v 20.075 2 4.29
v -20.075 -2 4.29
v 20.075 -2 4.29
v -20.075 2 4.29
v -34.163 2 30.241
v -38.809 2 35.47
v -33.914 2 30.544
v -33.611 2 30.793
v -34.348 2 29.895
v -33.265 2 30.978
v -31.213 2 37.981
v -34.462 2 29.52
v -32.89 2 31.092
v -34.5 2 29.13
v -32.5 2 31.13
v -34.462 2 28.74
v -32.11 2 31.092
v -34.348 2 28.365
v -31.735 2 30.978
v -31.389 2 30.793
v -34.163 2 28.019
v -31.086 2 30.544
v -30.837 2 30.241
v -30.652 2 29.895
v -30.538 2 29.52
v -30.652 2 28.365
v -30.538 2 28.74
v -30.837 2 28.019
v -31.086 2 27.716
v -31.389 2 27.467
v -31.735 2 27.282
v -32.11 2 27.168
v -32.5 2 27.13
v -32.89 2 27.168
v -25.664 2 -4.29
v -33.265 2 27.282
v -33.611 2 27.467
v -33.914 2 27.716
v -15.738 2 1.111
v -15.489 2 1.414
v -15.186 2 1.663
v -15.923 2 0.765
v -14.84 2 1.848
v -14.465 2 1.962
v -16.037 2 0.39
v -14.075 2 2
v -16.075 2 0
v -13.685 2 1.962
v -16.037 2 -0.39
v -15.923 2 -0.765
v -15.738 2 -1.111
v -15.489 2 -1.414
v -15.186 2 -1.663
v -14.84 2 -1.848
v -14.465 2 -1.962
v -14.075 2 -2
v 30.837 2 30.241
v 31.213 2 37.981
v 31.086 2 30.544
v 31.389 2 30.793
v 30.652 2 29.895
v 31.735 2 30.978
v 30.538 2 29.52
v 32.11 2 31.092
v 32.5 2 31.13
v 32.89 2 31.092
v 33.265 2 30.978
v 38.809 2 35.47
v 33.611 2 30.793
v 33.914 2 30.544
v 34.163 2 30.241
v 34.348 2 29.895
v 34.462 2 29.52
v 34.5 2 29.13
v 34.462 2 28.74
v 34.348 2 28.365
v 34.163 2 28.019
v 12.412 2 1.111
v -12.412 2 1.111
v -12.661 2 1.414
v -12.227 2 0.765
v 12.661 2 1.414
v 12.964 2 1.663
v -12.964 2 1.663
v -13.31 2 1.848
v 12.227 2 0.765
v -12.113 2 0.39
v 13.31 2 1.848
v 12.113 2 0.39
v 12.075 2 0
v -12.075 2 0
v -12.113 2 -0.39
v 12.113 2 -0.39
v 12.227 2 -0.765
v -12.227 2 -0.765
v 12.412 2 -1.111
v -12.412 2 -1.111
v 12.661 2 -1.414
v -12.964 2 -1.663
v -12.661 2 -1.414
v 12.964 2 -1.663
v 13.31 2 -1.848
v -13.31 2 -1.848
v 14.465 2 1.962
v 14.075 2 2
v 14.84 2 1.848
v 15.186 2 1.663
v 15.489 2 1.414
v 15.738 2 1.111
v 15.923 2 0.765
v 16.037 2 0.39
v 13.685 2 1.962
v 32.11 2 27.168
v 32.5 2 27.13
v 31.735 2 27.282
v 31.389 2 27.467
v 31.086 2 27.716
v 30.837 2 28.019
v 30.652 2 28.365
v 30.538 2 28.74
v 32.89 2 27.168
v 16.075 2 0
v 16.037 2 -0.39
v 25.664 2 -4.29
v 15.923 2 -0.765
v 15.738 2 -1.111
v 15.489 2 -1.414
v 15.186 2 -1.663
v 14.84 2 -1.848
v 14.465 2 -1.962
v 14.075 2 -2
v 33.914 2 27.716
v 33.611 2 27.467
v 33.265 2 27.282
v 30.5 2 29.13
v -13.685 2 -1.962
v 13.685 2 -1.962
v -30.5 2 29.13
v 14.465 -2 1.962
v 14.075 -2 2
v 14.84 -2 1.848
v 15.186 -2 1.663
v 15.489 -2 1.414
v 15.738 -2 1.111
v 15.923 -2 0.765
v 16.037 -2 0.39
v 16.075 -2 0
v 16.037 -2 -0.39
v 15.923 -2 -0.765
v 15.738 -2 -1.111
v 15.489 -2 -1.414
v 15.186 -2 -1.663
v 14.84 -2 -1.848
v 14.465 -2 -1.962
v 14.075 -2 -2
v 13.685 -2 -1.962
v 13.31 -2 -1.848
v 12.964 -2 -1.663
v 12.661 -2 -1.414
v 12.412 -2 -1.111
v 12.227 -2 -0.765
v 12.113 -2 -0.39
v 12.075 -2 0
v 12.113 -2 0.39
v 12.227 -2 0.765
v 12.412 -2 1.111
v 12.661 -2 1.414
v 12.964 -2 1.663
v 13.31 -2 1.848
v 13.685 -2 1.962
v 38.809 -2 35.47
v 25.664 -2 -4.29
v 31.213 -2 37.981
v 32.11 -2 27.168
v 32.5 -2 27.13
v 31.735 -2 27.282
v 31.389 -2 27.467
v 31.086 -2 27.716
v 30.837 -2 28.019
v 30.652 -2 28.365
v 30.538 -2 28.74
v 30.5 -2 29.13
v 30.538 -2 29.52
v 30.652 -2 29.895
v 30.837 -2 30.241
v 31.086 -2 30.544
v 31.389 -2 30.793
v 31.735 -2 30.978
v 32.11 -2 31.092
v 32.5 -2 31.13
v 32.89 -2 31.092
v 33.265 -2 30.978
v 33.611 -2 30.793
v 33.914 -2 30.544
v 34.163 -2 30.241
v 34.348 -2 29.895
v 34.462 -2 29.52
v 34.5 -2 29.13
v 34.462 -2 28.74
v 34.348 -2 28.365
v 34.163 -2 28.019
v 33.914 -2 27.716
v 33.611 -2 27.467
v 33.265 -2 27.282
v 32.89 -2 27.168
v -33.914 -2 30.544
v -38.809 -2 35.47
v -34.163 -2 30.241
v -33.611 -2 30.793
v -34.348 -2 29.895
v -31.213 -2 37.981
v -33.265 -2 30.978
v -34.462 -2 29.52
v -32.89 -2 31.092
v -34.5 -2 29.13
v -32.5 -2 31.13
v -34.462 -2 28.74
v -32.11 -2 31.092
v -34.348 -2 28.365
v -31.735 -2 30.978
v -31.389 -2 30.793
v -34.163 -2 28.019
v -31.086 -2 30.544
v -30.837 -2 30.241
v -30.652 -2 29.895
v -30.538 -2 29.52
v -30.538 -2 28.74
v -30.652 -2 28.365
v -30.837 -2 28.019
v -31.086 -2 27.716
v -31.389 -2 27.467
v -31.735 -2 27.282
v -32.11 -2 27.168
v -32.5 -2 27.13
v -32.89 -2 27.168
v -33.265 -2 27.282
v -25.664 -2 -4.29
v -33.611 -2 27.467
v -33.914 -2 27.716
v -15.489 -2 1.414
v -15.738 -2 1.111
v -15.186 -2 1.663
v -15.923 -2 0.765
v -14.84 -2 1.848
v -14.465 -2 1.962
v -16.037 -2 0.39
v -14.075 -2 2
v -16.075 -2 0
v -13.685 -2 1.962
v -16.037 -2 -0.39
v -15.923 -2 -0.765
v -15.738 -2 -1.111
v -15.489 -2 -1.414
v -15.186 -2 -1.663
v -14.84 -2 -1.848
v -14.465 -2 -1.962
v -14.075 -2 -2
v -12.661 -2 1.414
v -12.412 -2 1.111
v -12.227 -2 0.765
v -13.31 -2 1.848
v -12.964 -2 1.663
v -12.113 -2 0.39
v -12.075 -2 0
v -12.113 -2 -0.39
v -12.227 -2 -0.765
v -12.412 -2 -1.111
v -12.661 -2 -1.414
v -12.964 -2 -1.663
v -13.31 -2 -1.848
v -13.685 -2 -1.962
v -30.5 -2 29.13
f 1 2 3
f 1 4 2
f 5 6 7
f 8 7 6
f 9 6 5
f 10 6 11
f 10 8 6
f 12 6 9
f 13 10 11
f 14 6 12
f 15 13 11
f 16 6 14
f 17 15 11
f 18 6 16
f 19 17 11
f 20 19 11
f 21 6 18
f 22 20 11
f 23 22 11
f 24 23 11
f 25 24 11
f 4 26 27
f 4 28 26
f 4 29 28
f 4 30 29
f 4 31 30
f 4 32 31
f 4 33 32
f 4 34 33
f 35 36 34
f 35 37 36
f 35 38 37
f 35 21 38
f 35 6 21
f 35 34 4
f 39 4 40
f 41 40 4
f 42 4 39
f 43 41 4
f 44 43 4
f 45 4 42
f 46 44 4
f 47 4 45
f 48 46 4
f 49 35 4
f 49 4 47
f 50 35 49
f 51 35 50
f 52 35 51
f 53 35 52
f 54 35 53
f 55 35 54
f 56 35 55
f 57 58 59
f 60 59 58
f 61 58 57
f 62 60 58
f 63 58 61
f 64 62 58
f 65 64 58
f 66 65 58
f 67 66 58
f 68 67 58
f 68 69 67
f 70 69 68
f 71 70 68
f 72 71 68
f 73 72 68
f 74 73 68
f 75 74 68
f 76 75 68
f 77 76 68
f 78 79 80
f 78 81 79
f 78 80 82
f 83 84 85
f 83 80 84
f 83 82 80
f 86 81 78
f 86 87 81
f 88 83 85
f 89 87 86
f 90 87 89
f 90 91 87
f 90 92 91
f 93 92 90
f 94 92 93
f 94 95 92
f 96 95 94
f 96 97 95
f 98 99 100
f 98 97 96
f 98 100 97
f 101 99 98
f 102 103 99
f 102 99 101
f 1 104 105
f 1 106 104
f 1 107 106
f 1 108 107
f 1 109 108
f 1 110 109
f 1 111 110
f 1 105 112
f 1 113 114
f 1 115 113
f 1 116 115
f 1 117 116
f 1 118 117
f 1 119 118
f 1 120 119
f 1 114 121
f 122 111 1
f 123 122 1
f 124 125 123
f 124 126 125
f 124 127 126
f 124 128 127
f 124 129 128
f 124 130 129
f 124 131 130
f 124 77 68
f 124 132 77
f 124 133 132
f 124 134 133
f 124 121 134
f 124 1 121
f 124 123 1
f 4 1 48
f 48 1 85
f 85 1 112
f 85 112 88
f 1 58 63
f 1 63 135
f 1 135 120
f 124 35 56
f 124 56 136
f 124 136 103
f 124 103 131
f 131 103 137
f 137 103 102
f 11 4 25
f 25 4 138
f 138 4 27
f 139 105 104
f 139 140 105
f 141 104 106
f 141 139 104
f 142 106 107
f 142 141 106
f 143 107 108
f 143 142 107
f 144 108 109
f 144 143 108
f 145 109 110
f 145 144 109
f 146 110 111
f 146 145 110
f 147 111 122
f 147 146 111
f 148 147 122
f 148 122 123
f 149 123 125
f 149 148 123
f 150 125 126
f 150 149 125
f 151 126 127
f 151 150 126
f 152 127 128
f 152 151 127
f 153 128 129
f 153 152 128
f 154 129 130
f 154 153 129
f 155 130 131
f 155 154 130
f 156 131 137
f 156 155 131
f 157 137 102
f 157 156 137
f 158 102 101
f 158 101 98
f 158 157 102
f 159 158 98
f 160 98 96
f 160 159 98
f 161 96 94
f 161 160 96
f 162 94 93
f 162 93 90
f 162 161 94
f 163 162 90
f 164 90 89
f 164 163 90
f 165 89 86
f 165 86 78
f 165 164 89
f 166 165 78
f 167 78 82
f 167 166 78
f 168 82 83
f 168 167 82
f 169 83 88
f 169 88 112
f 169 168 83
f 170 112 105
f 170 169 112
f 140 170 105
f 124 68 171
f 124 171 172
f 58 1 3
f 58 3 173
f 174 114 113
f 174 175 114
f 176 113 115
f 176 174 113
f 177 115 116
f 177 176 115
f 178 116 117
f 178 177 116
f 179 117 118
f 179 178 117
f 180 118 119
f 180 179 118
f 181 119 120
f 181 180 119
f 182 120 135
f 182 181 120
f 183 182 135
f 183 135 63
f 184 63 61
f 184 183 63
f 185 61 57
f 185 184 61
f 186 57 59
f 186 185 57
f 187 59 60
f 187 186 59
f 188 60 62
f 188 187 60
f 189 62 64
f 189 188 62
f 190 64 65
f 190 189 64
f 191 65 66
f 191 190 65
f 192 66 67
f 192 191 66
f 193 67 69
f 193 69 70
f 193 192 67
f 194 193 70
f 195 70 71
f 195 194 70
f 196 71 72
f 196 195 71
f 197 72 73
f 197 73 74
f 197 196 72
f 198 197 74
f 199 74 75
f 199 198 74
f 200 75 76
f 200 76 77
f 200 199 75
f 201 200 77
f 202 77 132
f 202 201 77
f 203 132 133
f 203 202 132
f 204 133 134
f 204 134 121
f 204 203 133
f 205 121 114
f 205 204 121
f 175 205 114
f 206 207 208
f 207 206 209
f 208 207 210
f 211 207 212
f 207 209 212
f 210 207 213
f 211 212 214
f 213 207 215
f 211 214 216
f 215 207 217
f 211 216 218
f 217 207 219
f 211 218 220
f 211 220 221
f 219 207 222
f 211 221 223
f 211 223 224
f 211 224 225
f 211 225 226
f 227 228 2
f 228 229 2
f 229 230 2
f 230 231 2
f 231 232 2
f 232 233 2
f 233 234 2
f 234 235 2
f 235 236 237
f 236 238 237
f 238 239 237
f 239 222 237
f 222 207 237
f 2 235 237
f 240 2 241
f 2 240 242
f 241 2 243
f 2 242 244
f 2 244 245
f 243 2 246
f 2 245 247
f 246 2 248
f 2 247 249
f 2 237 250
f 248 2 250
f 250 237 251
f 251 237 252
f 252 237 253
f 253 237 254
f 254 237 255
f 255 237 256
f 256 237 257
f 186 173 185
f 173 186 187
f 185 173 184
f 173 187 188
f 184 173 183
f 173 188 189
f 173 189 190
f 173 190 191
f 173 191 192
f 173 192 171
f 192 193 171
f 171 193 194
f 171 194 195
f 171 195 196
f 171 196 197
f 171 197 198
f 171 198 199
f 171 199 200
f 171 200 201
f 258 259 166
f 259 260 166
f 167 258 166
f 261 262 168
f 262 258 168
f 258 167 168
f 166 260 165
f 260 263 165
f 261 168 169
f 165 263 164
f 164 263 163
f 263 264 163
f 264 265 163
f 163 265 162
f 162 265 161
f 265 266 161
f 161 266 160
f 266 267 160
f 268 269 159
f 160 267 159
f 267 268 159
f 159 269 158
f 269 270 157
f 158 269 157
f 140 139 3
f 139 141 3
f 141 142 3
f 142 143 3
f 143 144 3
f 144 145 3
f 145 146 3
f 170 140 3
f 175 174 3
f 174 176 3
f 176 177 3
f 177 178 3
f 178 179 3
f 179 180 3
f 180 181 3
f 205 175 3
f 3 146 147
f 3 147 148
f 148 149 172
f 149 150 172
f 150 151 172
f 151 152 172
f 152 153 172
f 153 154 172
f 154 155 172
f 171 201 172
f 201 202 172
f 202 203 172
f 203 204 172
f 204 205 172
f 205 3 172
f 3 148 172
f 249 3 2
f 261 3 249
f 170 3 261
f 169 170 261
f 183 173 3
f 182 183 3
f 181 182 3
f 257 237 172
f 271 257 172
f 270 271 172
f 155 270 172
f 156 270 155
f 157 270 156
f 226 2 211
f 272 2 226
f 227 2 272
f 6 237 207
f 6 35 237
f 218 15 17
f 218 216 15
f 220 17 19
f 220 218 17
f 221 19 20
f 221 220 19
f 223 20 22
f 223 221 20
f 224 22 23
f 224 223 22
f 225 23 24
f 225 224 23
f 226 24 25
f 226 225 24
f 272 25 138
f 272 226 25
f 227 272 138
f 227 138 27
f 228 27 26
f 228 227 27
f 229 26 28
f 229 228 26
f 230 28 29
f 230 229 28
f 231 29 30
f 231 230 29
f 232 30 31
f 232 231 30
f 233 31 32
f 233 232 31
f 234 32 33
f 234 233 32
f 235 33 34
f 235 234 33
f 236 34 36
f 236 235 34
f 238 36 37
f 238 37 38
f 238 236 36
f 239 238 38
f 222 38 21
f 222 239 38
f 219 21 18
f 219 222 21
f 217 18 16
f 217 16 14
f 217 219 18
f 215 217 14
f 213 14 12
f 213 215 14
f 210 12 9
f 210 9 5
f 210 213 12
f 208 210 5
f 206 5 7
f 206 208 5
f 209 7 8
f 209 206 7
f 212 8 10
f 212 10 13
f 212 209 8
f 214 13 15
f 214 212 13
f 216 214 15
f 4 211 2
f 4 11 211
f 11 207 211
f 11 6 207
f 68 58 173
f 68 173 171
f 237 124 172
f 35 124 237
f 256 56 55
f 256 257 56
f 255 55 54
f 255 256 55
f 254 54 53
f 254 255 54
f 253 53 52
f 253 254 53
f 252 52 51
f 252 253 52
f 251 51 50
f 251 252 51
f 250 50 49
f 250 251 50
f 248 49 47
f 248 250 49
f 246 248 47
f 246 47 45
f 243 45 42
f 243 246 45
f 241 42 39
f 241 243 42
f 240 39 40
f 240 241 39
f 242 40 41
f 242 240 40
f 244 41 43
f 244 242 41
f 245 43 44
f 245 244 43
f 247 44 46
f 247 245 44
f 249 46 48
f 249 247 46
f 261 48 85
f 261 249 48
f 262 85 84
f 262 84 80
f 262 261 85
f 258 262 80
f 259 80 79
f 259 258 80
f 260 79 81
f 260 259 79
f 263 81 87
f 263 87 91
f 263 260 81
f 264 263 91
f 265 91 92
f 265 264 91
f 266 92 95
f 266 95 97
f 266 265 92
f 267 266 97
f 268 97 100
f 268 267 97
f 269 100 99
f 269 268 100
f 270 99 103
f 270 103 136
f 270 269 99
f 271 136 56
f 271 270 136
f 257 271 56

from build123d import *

# Parameters (mm, degrees)
SKETCH1_R           = 2
BOSS_EXTRUDE1_DEPTH = 2


with BuildPart() as part:
    # Sketch1 → Boss-Extrude1 (new, symmetric)
    with BuildSketch(Plane(origin=(0, 0, 0), x_dir=(1, 0, 0), z_dir=(0, 1, 0))):
        Polygon((-20.075, -4.29), (20.075, -4.29), (31.213284153, -37.981235074), (38.808958551, -35.470113721), (25.664309991, 4.29), (20.075, 4.29), (-20.075, 4.29), (-25.664309991, 4.29), (-38.808958551, -35.470113721), (-31.213284153, -37.981235074), align=None)
        with Locations(Location((14.075, 0, 0), (0, 0, 270))):
            Circle(SKETCH1_R, mode=Mode.SUBTRACT)
        with Locations(Location((-14.075, 0, 0), (0, 0, 90))):
            Circle(SKETCH1_R, mode=Mode.SUBTRACT)
        with Locations(Location((-32.5, -29.13, 0), (0, 0, 270))):
            Circle(SKETCH1_R, mode=Mode.SUBTRACT)
        with Locations(Location((32.5, -29.13, 0), (0, 0, 90))):
            Circle(SKETCH1_R, mode=Mode.SUBTRACT)
    extrude(amount=BOSS_EXTRUDE1_DEPTH, both=True)


solid = part.part
